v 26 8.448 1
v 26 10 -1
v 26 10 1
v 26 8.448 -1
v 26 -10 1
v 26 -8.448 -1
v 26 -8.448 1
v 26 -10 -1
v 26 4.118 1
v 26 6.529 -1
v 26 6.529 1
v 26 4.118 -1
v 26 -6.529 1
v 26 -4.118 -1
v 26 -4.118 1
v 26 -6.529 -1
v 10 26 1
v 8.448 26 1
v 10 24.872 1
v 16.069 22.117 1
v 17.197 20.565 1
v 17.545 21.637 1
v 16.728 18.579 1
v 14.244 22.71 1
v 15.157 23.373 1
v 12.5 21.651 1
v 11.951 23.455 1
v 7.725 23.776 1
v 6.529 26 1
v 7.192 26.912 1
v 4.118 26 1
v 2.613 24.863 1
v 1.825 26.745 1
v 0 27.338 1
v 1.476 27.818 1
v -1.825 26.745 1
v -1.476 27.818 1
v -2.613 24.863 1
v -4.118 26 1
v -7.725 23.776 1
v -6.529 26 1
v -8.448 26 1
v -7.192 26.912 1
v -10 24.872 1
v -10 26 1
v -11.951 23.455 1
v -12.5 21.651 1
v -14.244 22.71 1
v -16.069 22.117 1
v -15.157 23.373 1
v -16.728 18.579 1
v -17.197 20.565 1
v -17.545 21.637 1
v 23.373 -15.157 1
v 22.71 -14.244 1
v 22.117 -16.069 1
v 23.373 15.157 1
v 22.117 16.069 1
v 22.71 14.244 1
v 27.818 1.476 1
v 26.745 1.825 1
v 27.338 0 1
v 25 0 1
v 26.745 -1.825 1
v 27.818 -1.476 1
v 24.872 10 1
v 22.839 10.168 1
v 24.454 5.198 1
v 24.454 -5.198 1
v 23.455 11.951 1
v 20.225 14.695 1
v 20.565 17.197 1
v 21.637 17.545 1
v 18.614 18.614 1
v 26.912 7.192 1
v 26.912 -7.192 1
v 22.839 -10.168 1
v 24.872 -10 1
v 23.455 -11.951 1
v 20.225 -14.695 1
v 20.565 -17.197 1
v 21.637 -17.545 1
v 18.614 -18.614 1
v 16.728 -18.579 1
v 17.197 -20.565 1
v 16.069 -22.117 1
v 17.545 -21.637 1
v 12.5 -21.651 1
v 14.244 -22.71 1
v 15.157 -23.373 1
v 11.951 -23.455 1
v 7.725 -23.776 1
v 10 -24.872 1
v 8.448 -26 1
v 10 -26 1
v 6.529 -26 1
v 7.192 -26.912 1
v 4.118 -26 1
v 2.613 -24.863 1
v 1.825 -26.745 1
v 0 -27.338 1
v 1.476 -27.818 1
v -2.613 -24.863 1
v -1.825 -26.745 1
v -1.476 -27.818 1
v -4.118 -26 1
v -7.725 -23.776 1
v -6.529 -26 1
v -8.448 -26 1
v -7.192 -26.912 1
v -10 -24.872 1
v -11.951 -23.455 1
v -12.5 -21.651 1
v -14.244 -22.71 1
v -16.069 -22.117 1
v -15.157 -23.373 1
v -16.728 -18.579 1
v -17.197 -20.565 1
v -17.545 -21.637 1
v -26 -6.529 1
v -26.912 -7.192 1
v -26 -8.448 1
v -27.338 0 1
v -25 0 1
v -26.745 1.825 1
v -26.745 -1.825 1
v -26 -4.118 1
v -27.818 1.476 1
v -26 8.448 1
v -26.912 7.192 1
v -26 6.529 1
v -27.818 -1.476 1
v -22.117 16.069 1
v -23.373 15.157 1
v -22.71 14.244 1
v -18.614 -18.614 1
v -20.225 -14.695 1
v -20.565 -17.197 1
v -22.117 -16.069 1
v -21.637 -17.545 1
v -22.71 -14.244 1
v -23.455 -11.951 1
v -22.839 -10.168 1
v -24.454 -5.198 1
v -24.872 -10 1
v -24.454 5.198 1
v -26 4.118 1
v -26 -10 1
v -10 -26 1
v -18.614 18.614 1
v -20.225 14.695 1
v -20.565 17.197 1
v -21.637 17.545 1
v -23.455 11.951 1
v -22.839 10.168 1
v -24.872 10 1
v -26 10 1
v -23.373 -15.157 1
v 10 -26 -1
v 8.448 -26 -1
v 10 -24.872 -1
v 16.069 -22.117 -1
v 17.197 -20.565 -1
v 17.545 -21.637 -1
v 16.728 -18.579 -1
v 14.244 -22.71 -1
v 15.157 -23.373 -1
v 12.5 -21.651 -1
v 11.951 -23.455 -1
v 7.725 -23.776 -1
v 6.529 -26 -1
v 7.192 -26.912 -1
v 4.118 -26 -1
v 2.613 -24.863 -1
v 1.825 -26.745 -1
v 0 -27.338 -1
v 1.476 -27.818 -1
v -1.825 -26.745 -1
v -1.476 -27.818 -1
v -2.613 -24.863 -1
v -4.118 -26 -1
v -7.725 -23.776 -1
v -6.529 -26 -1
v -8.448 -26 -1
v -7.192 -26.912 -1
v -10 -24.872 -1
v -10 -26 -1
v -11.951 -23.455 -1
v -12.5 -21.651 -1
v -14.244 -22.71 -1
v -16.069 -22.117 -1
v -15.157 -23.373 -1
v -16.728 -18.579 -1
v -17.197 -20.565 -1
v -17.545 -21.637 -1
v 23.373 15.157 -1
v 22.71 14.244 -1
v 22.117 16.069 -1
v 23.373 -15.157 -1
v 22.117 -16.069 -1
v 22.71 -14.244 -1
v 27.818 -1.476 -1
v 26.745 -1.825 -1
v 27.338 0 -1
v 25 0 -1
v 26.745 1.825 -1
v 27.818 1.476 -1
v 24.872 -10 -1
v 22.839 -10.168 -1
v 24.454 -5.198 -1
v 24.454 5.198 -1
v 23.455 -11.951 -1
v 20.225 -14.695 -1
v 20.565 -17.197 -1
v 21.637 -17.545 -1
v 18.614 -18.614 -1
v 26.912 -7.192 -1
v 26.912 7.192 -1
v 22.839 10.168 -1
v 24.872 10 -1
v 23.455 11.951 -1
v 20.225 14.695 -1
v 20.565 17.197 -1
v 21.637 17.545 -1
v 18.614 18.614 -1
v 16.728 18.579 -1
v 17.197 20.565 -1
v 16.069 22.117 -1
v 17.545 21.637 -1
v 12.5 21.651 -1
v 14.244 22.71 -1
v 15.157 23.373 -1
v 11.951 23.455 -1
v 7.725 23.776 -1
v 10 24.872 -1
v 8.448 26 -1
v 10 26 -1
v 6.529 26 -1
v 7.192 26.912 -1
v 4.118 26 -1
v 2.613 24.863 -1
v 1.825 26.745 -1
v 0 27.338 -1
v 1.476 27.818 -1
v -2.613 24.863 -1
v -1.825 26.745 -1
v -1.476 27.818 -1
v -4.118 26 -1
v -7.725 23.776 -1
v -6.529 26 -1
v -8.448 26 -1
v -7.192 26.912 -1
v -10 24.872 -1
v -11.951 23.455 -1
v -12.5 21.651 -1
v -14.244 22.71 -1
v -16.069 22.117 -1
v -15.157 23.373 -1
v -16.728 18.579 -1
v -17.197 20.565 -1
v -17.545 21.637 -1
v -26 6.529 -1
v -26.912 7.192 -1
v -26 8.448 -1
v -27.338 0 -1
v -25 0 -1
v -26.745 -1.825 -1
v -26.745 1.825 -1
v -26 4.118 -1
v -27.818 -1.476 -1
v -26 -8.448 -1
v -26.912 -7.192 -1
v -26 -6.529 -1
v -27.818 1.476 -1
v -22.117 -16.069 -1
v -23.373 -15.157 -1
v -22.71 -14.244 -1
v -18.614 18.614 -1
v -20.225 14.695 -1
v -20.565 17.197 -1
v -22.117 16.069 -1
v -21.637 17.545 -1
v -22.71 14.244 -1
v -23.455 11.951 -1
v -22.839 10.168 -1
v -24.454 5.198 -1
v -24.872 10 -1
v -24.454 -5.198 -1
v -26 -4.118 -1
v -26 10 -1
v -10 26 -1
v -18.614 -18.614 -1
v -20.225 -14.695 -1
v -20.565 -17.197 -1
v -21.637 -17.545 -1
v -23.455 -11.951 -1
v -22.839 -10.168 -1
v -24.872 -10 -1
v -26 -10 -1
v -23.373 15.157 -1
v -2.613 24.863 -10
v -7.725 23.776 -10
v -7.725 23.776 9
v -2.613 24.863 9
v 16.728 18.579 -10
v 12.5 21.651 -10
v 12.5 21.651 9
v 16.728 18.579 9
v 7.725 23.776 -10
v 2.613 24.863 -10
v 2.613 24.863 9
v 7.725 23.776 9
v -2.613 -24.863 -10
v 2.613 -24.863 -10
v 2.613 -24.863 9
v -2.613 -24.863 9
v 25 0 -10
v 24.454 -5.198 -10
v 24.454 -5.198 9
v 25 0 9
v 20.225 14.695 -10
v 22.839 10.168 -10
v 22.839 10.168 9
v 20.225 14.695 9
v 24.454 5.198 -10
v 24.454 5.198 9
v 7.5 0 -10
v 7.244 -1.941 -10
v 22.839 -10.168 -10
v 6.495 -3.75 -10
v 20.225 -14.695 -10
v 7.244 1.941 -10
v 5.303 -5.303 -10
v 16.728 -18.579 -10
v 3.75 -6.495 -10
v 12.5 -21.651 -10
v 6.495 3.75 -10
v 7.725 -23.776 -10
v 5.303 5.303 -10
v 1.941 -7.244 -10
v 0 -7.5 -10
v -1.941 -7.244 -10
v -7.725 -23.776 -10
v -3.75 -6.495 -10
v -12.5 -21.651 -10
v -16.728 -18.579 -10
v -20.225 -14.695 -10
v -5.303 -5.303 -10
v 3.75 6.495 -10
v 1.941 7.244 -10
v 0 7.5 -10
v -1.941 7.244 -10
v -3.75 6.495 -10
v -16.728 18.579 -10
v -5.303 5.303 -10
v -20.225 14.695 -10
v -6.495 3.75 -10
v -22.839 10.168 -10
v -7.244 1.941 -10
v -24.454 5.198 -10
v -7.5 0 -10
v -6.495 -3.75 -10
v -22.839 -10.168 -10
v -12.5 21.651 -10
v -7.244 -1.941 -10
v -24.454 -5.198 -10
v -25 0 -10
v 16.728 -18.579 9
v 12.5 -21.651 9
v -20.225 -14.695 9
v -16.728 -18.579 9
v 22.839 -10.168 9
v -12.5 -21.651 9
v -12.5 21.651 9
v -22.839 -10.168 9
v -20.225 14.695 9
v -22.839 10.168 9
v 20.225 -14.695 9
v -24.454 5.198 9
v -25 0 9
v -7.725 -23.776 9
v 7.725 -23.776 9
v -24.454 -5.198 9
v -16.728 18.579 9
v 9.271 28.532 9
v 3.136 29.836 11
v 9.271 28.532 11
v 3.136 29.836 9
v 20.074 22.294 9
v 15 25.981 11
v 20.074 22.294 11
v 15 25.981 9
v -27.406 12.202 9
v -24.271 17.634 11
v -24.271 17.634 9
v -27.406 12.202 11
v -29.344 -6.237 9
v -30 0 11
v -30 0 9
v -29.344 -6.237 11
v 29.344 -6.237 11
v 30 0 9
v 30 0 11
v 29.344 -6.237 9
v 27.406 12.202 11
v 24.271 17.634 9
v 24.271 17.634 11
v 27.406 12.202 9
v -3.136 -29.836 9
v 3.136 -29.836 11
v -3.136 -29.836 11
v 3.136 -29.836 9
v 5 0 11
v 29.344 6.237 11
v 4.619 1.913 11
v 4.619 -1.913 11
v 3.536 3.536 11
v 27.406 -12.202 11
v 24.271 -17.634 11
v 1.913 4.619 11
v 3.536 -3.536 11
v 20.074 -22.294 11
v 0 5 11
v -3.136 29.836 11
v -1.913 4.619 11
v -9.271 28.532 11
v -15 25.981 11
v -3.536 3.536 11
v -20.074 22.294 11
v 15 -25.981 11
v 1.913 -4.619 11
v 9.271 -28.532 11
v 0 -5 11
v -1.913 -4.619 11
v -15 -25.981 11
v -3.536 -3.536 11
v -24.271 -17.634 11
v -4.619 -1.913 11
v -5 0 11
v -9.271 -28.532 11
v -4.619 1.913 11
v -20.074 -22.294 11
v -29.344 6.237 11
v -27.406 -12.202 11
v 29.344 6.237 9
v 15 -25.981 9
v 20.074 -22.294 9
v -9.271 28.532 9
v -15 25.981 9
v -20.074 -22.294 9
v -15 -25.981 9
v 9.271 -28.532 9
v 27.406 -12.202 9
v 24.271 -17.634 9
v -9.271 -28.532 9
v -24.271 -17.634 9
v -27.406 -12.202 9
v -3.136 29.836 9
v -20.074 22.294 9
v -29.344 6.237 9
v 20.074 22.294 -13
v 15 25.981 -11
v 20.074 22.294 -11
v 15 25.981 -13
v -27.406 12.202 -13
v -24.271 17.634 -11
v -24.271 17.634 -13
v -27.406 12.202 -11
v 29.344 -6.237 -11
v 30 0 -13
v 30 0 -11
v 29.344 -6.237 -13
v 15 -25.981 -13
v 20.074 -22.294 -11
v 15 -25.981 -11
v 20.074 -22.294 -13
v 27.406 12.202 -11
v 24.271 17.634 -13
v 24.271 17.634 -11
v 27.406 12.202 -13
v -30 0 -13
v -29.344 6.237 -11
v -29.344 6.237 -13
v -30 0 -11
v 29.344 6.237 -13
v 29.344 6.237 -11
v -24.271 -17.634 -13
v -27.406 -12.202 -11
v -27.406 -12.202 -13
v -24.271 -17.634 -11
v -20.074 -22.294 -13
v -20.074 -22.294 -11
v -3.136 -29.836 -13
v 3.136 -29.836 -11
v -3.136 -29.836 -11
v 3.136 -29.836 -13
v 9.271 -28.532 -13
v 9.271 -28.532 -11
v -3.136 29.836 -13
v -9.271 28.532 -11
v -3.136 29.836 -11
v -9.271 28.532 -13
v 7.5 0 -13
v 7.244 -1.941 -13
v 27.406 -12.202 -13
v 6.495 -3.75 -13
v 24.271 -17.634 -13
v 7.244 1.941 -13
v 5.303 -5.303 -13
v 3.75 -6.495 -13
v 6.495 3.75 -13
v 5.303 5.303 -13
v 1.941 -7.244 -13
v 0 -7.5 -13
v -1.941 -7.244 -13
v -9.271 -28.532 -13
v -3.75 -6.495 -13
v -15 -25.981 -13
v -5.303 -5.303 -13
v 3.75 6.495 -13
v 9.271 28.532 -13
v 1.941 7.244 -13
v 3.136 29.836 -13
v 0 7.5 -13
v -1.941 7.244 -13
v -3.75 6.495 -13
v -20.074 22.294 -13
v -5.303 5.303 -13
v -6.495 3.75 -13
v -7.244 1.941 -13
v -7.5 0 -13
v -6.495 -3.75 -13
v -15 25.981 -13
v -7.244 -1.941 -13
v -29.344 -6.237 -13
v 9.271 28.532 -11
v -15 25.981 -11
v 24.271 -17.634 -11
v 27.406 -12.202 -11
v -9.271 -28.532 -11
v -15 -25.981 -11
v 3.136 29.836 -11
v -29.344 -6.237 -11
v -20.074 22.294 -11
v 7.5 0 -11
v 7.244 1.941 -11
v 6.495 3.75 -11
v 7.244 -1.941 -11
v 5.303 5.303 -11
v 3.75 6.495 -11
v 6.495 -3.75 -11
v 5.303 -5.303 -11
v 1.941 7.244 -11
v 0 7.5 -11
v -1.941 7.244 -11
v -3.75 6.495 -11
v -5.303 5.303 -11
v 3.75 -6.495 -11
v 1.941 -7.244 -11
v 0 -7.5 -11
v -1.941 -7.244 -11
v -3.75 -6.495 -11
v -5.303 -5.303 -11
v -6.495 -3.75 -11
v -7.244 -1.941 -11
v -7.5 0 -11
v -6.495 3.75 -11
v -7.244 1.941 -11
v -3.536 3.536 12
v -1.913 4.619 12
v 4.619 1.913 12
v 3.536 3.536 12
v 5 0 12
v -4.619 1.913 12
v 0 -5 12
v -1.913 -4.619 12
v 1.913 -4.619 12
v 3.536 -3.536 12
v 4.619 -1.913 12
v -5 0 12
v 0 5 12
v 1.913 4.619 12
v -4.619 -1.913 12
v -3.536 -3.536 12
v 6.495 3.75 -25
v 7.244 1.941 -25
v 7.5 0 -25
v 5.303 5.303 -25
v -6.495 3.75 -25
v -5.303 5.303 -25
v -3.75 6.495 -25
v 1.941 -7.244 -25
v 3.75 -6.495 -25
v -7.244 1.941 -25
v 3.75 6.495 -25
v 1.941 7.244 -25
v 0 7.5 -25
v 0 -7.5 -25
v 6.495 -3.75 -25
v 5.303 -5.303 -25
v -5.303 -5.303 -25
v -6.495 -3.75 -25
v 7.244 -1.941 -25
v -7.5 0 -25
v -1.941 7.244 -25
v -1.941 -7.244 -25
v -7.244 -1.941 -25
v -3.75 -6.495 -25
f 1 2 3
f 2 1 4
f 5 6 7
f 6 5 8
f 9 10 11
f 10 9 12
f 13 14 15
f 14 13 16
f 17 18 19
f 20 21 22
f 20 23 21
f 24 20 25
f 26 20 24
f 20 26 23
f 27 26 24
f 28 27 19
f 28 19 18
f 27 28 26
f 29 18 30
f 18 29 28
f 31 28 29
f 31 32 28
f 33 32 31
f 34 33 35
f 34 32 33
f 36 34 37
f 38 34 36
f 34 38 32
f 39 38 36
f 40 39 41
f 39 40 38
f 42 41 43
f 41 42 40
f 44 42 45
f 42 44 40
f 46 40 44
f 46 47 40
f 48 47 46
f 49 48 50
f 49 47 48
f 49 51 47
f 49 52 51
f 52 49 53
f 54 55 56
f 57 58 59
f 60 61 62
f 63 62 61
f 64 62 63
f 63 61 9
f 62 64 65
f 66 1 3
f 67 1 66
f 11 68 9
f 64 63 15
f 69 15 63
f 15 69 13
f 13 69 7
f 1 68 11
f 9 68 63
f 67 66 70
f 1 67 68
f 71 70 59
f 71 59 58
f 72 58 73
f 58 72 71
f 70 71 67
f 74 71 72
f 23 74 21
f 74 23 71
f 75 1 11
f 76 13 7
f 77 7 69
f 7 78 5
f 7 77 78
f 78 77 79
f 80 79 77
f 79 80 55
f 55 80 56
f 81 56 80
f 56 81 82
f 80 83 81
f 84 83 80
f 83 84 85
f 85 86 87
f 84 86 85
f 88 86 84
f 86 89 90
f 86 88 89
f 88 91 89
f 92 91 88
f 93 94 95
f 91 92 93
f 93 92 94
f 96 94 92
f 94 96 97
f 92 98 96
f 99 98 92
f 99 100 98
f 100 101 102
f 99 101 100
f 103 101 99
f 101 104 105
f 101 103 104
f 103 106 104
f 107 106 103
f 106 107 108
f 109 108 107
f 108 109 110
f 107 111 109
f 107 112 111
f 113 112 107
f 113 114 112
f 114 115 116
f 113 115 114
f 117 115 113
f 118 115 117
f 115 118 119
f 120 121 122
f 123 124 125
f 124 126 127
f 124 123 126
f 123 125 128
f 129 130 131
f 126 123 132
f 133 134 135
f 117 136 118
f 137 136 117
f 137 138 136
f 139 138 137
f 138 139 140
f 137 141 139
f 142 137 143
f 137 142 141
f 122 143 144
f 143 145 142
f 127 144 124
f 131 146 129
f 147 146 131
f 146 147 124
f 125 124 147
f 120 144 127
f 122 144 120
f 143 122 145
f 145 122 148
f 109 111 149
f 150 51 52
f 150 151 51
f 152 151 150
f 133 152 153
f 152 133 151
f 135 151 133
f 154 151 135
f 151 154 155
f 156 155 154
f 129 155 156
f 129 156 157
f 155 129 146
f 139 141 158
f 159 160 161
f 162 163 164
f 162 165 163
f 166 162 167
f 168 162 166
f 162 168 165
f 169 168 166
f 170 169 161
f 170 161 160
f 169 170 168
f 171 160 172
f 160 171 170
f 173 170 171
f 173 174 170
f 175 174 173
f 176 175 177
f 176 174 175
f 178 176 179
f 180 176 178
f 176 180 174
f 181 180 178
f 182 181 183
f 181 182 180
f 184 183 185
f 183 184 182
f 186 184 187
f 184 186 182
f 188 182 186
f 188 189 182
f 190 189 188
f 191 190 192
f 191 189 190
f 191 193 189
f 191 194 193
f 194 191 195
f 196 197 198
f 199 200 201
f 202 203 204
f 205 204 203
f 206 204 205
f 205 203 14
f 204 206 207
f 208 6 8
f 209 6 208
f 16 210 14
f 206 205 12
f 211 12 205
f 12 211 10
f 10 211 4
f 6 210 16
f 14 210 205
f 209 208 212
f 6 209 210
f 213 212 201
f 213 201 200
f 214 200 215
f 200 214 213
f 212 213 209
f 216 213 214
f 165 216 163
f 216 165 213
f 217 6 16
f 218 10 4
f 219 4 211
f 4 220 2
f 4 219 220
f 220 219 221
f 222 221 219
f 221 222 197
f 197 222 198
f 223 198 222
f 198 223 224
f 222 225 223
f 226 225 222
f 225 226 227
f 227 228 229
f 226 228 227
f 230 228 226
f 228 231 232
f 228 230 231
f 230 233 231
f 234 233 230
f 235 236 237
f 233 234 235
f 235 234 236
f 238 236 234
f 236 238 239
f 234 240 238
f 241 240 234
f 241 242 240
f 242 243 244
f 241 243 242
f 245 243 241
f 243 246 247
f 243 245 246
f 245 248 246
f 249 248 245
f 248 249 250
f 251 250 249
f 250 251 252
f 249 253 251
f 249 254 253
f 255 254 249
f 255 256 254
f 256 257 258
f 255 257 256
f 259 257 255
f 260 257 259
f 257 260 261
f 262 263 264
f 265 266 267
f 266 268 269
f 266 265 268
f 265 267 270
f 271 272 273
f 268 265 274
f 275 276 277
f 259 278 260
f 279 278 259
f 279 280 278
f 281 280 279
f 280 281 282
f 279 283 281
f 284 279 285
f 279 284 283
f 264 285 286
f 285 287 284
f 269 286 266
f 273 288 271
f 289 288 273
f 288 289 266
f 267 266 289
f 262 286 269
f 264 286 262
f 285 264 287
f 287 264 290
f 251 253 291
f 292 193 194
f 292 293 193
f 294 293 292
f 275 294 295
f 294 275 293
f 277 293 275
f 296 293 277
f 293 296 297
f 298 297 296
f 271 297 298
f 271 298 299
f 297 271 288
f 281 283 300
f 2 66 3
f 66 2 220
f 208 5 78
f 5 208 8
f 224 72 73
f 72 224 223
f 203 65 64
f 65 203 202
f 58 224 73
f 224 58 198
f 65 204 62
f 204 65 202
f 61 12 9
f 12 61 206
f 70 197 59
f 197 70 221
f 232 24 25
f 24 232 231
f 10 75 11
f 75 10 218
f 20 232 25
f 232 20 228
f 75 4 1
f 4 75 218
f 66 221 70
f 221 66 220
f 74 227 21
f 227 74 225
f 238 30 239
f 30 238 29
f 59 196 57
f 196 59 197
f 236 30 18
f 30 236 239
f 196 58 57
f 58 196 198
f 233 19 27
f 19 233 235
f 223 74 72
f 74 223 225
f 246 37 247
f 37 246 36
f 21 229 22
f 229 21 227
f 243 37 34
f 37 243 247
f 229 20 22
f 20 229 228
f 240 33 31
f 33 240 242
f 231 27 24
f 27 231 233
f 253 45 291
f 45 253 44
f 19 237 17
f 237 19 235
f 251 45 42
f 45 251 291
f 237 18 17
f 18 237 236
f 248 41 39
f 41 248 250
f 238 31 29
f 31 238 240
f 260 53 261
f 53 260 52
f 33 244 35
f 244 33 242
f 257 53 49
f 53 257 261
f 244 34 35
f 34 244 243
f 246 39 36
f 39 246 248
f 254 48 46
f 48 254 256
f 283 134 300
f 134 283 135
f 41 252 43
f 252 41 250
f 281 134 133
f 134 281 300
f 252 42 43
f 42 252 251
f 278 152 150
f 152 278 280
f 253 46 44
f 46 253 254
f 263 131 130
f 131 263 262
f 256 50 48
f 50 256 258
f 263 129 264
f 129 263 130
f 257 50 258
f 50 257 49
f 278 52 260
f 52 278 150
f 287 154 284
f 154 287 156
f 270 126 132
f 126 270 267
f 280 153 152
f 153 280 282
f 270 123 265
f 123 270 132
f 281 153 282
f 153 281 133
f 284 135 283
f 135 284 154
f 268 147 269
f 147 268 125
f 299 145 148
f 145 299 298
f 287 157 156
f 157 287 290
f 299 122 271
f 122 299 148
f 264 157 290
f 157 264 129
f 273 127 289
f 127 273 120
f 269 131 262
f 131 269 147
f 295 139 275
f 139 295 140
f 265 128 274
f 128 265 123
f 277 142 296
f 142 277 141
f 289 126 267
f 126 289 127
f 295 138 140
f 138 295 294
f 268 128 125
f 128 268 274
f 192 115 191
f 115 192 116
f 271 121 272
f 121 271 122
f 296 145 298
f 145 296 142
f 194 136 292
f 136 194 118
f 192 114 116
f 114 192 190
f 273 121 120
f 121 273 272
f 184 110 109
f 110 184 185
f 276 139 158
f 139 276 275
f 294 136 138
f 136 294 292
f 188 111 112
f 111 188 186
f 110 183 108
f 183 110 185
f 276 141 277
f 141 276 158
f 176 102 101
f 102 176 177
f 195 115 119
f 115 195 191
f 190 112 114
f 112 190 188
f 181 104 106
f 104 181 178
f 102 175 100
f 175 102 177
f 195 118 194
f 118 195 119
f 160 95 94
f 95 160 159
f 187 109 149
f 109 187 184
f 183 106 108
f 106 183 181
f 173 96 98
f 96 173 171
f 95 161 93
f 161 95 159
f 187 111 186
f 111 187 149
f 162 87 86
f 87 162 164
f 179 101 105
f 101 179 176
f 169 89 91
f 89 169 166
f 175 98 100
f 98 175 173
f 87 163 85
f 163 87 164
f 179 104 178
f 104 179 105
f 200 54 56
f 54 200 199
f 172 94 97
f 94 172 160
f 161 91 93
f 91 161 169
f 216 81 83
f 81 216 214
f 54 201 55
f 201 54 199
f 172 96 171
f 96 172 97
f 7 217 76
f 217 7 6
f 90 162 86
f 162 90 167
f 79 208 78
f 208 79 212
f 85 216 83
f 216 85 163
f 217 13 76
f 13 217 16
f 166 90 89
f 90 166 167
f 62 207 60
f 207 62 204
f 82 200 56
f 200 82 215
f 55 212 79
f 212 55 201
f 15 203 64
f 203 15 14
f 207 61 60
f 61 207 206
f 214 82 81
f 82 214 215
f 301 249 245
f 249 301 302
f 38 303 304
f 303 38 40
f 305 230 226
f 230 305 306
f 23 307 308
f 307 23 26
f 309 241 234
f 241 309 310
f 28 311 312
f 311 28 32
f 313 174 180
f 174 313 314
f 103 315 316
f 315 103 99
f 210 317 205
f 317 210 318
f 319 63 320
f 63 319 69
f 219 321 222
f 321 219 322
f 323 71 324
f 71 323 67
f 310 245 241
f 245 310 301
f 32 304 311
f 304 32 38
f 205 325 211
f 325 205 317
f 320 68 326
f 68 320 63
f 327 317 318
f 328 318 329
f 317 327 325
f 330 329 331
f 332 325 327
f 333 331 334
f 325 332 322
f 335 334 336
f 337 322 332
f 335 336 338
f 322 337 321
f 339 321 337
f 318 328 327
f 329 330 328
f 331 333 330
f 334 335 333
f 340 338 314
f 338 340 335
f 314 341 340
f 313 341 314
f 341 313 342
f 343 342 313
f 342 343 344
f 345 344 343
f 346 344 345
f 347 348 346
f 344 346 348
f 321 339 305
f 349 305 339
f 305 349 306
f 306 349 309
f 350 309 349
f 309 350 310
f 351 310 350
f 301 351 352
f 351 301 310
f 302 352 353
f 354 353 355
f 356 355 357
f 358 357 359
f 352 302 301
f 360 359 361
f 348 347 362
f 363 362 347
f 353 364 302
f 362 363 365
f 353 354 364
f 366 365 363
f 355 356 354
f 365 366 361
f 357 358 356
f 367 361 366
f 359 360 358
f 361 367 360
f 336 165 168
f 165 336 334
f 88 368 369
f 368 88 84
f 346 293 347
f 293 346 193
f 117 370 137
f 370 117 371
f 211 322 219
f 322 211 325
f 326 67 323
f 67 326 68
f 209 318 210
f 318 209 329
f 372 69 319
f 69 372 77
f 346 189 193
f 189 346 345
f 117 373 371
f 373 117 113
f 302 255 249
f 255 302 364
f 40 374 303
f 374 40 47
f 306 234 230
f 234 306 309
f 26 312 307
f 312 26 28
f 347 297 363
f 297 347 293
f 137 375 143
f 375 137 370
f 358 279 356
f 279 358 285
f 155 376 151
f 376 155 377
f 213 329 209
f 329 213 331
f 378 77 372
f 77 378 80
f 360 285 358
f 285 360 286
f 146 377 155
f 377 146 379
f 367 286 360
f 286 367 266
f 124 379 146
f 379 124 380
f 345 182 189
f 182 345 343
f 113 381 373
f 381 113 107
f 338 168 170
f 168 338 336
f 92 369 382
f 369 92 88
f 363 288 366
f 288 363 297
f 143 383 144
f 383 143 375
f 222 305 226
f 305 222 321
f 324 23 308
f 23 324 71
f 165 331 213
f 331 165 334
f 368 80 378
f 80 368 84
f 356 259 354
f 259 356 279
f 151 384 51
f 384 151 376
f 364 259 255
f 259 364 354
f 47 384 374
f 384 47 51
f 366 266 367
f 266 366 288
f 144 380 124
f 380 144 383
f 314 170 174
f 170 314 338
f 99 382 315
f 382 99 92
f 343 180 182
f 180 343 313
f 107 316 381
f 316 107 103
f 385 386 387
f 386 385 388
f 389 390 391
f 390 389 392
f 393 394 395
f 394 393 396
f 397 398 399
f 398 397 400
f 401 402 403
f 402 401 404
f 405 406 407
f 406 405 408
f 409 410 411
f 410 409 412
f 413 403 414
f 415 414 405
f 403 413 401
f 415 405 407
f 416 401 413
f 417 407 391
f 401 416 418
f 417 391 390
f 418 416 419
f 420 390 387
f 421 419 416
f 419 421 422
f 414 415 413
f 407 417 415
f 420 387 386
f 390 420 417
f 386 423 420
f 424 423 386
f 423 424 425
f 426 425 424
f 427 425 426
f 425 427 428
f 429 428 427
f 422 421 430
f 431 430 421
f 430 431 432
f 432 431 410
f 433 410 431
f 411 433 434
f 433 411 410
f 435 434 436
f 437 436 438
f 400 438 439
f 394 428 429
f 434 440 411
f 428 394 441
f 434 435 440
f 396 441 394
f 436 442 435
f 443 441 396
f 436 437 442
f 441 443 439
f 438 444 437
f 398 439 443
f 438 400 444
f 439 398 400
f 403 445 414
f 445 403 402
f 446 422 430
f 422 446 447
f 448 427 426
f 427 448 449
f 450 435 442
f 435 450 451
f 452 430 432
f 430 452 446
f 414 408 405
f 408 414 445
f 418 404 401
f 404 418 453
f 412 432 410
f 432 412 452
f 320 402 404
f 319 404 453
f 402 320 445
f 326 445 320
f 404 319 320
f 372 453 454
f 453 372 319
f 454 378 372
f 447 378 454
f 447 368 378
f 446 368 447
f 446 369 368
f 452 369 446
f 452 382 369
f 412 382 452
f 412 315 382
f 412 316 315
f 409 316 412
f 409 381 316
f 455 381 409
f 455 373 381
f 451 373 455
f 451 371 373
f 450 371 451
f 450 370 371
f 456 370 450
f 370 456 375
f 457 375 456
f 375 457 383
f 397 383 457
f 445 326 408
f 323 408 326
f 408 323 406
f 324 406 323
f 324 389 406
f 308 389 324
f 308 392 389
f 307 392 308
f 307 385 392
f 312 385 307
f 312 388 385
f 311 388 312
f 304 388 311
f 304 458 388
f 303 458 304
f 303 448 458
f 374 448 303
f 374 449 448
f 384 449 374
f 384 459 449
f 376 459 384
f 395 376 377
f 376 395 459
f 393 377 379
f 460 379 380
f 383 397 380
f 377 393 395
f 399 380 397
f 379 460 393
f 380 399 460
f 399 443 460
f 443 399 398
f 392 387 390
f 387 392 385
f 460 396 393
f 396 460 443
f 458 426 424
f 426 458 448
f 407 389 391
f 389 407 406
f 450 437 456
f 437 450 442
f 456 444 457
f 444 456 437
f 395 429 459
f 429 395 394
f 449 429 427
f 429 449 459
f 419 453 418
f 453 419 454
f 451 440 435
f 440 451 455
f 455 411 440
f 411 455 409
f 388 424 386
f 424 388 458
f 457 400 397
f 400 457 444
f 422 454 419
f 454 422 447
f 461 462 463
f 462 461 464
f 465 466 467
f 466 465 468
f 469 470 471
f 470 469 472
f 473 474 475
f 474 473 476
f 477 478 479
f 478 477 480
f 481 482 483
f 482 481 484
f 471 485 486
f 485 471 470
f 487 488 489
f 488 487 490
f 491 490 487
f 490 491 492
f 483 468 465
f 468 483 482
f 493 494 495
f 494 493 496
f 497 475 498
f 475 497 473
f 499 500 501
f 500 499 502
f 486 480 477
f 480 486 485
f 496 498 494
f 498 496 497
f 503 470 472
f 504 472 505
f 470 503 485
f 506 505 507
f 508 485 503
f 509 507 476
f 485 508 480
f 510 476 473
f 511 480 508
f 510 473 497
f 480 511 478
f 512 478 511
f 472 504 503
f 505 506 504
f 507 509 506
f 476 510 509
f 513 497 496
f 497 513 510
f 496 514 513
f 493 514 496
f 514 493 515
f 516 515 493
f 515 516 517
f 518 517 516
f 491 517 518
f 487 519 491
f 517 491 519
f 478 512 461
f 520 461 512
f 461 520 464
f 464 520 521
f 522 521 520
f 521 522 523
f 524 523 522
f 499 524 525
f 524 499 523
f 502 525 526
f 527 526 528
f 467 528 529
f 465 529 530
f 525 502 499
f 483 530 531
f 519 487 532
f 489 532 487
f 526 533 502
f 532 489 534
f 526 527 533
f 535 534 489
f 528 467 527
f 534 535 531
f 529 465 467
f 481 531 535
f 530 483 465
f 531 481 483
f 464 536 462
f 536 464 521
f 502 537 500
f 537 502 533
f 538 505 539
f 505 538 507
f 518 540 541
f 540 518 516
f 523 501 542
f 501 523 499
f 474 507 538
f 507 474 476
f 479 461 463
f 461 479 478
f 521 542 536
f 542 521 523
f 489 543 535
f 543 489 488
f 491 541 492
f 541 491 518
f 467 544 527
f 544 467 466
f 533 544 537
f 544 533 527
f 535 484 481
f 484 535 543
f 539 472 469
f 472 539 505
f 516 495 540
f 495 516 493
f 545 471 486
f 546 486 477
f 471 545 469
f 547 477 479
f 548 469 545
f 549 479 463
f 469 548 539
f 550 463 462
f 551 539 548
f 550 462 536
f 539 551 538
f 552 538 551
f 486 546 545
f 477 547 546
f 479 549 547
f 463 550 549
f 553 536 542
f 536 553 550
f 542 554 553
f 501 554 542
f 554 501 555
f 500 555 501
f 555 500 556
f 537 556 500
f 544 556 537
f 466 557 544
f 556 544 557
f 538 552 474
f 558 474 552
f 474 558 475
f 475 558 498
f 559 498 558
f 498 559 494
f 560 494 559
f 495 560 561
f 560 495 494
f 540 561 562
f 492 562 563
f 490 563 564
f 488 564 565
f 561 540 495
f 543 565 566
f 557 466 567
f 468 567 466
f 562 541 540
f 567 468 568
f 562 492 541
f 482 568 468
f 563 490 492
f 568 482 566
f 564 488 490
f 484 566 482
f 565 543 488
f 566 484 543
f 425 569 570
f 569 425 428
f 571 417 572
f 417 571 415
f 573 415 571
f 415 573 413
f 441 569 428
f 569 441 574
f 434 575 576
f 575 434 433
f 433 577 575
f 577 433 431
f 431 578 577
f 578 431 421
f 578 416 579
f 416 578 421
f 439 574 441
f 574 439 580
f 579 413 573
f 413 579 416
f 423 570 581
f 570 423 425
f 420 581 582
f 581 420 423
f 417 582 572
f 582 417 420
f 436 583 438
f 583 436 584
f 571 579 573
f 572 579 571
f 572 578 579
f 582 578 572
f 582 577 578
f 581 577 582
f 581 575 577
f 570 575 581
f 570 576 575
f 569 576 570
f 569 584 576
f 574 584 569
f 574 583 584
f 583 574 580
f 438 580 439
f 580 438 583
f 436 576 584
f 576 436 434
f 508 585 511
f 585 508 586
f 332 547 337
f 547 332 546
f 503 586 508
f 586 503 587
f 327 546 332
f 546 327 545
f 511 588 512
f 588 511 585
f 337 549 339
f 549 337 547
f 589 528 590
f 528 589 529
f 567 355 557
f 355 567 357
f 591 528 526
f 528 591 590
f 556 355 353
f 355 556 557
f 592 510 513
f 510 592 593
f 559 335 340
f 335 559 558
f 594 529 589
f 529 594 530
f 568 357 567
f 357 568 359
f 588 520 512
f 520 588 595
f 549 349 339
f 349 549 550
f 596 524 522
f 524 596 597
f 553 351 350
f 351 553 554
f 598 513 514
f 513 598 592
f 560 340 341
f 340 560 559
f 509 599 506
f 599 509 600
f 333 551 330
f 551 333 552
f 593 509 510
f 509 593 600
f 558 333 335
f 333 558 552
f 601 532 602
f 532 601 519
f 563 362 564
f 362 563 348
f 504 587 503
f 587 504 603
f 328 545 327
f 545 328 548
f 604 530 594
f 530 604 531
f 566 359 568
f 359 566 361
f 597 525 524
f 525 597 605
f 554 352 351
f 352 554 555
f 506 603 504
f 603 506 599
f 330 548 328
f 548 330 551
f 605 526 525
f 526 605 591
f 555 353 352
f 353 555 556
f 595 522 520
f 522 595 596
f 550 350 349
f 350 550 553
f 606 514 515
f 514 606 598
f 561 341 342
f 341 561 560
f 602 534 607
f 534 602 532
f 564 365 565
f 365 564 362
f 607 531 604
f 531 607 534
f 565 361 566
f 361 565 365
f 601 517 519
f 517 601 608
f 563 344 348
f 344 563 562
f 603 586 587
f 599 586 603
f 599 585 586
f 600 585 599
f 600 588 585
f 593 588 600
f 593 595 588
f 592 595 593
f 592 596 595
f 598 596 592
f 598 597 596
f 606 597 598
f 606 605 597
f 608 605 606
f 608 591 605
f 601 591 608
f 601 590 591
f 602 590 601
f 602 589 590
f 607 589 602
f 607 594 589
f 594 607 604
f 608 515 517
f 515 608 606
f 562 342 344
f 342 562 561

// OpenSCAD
// Parameters
pulley_diameter = 50;
pulley_width = 20;
bore_diameter = 10;
hub_diameter = 15;
hub_length = 25;
flange_thickness = 2;
flange_diameter = pulley_diameter + 10;
set_screw_diameter = 2;
set_screw_distance = 5;
tooth_depth = 2;
tooth_count = 20;

// Main pulley module
module pulley() {
    pulley_body();
    outer_rim();
    center_bore();
    hub();
    flanges();
    set_screw_holes();
}

// Pulley body
module pulley_body() {
    difference() {
        cylinder(d=pulley_diameter, h=pulley_width, center=true);
        if (tooth_depth > 0) {
            tooth_profile();
        }
    }
}

// Outer rim with optional teeth
module outer_rim() {
    if (tooth_depth > 0) {
        tooth_profile();
    } else {
        cylinder(d=pulley_diameter, h=pulley_width, center=true);
    }
}

// Center bore
module center_bore() {
    cylinder(d=bore_diameter, h=pulley_width + 2 * flange_thickness, center=true);
}

// Hub
module hub() {
    translate([0, 0, -hub_length / 2])
        cylinder(d=hub_diameter, h=hub_length, center=true);
}

// Flanges
module flanges() {
    translate([0, 0, pulley_width / 2])
        cylinder(d=flange_diameter, h=flange_thickness, center=true);
    translate([0, 0, -pulley_width / 2 - flange_thickness])
        cylinder(d=flange_diameter, h=flange_thickness, center=true);
}

// Set screw holes
module set_screw_holes() {
    for (angle = [0, 180]) {
        rotate([0, 0, angle])
            translate([hub_diameter / 2 + set_screw_distance, 0, 0])
                rotate([90, 0, 0])
                    cylinder(d=set_screw_diameter, h=hub_length, center=true);
    }
}

// Tooth profile
module tooth_profile() {
    for (i = [0:tooth_count - 1]) {
        rotate([0, 0, i * 360 / tooth_count])
            translate([pulley_diameter / 2, 0, 0])
                cube([tooth_depth, pulley_width, tooth_depth], center=true);
    }
}

// Render the pulley
pulley();
